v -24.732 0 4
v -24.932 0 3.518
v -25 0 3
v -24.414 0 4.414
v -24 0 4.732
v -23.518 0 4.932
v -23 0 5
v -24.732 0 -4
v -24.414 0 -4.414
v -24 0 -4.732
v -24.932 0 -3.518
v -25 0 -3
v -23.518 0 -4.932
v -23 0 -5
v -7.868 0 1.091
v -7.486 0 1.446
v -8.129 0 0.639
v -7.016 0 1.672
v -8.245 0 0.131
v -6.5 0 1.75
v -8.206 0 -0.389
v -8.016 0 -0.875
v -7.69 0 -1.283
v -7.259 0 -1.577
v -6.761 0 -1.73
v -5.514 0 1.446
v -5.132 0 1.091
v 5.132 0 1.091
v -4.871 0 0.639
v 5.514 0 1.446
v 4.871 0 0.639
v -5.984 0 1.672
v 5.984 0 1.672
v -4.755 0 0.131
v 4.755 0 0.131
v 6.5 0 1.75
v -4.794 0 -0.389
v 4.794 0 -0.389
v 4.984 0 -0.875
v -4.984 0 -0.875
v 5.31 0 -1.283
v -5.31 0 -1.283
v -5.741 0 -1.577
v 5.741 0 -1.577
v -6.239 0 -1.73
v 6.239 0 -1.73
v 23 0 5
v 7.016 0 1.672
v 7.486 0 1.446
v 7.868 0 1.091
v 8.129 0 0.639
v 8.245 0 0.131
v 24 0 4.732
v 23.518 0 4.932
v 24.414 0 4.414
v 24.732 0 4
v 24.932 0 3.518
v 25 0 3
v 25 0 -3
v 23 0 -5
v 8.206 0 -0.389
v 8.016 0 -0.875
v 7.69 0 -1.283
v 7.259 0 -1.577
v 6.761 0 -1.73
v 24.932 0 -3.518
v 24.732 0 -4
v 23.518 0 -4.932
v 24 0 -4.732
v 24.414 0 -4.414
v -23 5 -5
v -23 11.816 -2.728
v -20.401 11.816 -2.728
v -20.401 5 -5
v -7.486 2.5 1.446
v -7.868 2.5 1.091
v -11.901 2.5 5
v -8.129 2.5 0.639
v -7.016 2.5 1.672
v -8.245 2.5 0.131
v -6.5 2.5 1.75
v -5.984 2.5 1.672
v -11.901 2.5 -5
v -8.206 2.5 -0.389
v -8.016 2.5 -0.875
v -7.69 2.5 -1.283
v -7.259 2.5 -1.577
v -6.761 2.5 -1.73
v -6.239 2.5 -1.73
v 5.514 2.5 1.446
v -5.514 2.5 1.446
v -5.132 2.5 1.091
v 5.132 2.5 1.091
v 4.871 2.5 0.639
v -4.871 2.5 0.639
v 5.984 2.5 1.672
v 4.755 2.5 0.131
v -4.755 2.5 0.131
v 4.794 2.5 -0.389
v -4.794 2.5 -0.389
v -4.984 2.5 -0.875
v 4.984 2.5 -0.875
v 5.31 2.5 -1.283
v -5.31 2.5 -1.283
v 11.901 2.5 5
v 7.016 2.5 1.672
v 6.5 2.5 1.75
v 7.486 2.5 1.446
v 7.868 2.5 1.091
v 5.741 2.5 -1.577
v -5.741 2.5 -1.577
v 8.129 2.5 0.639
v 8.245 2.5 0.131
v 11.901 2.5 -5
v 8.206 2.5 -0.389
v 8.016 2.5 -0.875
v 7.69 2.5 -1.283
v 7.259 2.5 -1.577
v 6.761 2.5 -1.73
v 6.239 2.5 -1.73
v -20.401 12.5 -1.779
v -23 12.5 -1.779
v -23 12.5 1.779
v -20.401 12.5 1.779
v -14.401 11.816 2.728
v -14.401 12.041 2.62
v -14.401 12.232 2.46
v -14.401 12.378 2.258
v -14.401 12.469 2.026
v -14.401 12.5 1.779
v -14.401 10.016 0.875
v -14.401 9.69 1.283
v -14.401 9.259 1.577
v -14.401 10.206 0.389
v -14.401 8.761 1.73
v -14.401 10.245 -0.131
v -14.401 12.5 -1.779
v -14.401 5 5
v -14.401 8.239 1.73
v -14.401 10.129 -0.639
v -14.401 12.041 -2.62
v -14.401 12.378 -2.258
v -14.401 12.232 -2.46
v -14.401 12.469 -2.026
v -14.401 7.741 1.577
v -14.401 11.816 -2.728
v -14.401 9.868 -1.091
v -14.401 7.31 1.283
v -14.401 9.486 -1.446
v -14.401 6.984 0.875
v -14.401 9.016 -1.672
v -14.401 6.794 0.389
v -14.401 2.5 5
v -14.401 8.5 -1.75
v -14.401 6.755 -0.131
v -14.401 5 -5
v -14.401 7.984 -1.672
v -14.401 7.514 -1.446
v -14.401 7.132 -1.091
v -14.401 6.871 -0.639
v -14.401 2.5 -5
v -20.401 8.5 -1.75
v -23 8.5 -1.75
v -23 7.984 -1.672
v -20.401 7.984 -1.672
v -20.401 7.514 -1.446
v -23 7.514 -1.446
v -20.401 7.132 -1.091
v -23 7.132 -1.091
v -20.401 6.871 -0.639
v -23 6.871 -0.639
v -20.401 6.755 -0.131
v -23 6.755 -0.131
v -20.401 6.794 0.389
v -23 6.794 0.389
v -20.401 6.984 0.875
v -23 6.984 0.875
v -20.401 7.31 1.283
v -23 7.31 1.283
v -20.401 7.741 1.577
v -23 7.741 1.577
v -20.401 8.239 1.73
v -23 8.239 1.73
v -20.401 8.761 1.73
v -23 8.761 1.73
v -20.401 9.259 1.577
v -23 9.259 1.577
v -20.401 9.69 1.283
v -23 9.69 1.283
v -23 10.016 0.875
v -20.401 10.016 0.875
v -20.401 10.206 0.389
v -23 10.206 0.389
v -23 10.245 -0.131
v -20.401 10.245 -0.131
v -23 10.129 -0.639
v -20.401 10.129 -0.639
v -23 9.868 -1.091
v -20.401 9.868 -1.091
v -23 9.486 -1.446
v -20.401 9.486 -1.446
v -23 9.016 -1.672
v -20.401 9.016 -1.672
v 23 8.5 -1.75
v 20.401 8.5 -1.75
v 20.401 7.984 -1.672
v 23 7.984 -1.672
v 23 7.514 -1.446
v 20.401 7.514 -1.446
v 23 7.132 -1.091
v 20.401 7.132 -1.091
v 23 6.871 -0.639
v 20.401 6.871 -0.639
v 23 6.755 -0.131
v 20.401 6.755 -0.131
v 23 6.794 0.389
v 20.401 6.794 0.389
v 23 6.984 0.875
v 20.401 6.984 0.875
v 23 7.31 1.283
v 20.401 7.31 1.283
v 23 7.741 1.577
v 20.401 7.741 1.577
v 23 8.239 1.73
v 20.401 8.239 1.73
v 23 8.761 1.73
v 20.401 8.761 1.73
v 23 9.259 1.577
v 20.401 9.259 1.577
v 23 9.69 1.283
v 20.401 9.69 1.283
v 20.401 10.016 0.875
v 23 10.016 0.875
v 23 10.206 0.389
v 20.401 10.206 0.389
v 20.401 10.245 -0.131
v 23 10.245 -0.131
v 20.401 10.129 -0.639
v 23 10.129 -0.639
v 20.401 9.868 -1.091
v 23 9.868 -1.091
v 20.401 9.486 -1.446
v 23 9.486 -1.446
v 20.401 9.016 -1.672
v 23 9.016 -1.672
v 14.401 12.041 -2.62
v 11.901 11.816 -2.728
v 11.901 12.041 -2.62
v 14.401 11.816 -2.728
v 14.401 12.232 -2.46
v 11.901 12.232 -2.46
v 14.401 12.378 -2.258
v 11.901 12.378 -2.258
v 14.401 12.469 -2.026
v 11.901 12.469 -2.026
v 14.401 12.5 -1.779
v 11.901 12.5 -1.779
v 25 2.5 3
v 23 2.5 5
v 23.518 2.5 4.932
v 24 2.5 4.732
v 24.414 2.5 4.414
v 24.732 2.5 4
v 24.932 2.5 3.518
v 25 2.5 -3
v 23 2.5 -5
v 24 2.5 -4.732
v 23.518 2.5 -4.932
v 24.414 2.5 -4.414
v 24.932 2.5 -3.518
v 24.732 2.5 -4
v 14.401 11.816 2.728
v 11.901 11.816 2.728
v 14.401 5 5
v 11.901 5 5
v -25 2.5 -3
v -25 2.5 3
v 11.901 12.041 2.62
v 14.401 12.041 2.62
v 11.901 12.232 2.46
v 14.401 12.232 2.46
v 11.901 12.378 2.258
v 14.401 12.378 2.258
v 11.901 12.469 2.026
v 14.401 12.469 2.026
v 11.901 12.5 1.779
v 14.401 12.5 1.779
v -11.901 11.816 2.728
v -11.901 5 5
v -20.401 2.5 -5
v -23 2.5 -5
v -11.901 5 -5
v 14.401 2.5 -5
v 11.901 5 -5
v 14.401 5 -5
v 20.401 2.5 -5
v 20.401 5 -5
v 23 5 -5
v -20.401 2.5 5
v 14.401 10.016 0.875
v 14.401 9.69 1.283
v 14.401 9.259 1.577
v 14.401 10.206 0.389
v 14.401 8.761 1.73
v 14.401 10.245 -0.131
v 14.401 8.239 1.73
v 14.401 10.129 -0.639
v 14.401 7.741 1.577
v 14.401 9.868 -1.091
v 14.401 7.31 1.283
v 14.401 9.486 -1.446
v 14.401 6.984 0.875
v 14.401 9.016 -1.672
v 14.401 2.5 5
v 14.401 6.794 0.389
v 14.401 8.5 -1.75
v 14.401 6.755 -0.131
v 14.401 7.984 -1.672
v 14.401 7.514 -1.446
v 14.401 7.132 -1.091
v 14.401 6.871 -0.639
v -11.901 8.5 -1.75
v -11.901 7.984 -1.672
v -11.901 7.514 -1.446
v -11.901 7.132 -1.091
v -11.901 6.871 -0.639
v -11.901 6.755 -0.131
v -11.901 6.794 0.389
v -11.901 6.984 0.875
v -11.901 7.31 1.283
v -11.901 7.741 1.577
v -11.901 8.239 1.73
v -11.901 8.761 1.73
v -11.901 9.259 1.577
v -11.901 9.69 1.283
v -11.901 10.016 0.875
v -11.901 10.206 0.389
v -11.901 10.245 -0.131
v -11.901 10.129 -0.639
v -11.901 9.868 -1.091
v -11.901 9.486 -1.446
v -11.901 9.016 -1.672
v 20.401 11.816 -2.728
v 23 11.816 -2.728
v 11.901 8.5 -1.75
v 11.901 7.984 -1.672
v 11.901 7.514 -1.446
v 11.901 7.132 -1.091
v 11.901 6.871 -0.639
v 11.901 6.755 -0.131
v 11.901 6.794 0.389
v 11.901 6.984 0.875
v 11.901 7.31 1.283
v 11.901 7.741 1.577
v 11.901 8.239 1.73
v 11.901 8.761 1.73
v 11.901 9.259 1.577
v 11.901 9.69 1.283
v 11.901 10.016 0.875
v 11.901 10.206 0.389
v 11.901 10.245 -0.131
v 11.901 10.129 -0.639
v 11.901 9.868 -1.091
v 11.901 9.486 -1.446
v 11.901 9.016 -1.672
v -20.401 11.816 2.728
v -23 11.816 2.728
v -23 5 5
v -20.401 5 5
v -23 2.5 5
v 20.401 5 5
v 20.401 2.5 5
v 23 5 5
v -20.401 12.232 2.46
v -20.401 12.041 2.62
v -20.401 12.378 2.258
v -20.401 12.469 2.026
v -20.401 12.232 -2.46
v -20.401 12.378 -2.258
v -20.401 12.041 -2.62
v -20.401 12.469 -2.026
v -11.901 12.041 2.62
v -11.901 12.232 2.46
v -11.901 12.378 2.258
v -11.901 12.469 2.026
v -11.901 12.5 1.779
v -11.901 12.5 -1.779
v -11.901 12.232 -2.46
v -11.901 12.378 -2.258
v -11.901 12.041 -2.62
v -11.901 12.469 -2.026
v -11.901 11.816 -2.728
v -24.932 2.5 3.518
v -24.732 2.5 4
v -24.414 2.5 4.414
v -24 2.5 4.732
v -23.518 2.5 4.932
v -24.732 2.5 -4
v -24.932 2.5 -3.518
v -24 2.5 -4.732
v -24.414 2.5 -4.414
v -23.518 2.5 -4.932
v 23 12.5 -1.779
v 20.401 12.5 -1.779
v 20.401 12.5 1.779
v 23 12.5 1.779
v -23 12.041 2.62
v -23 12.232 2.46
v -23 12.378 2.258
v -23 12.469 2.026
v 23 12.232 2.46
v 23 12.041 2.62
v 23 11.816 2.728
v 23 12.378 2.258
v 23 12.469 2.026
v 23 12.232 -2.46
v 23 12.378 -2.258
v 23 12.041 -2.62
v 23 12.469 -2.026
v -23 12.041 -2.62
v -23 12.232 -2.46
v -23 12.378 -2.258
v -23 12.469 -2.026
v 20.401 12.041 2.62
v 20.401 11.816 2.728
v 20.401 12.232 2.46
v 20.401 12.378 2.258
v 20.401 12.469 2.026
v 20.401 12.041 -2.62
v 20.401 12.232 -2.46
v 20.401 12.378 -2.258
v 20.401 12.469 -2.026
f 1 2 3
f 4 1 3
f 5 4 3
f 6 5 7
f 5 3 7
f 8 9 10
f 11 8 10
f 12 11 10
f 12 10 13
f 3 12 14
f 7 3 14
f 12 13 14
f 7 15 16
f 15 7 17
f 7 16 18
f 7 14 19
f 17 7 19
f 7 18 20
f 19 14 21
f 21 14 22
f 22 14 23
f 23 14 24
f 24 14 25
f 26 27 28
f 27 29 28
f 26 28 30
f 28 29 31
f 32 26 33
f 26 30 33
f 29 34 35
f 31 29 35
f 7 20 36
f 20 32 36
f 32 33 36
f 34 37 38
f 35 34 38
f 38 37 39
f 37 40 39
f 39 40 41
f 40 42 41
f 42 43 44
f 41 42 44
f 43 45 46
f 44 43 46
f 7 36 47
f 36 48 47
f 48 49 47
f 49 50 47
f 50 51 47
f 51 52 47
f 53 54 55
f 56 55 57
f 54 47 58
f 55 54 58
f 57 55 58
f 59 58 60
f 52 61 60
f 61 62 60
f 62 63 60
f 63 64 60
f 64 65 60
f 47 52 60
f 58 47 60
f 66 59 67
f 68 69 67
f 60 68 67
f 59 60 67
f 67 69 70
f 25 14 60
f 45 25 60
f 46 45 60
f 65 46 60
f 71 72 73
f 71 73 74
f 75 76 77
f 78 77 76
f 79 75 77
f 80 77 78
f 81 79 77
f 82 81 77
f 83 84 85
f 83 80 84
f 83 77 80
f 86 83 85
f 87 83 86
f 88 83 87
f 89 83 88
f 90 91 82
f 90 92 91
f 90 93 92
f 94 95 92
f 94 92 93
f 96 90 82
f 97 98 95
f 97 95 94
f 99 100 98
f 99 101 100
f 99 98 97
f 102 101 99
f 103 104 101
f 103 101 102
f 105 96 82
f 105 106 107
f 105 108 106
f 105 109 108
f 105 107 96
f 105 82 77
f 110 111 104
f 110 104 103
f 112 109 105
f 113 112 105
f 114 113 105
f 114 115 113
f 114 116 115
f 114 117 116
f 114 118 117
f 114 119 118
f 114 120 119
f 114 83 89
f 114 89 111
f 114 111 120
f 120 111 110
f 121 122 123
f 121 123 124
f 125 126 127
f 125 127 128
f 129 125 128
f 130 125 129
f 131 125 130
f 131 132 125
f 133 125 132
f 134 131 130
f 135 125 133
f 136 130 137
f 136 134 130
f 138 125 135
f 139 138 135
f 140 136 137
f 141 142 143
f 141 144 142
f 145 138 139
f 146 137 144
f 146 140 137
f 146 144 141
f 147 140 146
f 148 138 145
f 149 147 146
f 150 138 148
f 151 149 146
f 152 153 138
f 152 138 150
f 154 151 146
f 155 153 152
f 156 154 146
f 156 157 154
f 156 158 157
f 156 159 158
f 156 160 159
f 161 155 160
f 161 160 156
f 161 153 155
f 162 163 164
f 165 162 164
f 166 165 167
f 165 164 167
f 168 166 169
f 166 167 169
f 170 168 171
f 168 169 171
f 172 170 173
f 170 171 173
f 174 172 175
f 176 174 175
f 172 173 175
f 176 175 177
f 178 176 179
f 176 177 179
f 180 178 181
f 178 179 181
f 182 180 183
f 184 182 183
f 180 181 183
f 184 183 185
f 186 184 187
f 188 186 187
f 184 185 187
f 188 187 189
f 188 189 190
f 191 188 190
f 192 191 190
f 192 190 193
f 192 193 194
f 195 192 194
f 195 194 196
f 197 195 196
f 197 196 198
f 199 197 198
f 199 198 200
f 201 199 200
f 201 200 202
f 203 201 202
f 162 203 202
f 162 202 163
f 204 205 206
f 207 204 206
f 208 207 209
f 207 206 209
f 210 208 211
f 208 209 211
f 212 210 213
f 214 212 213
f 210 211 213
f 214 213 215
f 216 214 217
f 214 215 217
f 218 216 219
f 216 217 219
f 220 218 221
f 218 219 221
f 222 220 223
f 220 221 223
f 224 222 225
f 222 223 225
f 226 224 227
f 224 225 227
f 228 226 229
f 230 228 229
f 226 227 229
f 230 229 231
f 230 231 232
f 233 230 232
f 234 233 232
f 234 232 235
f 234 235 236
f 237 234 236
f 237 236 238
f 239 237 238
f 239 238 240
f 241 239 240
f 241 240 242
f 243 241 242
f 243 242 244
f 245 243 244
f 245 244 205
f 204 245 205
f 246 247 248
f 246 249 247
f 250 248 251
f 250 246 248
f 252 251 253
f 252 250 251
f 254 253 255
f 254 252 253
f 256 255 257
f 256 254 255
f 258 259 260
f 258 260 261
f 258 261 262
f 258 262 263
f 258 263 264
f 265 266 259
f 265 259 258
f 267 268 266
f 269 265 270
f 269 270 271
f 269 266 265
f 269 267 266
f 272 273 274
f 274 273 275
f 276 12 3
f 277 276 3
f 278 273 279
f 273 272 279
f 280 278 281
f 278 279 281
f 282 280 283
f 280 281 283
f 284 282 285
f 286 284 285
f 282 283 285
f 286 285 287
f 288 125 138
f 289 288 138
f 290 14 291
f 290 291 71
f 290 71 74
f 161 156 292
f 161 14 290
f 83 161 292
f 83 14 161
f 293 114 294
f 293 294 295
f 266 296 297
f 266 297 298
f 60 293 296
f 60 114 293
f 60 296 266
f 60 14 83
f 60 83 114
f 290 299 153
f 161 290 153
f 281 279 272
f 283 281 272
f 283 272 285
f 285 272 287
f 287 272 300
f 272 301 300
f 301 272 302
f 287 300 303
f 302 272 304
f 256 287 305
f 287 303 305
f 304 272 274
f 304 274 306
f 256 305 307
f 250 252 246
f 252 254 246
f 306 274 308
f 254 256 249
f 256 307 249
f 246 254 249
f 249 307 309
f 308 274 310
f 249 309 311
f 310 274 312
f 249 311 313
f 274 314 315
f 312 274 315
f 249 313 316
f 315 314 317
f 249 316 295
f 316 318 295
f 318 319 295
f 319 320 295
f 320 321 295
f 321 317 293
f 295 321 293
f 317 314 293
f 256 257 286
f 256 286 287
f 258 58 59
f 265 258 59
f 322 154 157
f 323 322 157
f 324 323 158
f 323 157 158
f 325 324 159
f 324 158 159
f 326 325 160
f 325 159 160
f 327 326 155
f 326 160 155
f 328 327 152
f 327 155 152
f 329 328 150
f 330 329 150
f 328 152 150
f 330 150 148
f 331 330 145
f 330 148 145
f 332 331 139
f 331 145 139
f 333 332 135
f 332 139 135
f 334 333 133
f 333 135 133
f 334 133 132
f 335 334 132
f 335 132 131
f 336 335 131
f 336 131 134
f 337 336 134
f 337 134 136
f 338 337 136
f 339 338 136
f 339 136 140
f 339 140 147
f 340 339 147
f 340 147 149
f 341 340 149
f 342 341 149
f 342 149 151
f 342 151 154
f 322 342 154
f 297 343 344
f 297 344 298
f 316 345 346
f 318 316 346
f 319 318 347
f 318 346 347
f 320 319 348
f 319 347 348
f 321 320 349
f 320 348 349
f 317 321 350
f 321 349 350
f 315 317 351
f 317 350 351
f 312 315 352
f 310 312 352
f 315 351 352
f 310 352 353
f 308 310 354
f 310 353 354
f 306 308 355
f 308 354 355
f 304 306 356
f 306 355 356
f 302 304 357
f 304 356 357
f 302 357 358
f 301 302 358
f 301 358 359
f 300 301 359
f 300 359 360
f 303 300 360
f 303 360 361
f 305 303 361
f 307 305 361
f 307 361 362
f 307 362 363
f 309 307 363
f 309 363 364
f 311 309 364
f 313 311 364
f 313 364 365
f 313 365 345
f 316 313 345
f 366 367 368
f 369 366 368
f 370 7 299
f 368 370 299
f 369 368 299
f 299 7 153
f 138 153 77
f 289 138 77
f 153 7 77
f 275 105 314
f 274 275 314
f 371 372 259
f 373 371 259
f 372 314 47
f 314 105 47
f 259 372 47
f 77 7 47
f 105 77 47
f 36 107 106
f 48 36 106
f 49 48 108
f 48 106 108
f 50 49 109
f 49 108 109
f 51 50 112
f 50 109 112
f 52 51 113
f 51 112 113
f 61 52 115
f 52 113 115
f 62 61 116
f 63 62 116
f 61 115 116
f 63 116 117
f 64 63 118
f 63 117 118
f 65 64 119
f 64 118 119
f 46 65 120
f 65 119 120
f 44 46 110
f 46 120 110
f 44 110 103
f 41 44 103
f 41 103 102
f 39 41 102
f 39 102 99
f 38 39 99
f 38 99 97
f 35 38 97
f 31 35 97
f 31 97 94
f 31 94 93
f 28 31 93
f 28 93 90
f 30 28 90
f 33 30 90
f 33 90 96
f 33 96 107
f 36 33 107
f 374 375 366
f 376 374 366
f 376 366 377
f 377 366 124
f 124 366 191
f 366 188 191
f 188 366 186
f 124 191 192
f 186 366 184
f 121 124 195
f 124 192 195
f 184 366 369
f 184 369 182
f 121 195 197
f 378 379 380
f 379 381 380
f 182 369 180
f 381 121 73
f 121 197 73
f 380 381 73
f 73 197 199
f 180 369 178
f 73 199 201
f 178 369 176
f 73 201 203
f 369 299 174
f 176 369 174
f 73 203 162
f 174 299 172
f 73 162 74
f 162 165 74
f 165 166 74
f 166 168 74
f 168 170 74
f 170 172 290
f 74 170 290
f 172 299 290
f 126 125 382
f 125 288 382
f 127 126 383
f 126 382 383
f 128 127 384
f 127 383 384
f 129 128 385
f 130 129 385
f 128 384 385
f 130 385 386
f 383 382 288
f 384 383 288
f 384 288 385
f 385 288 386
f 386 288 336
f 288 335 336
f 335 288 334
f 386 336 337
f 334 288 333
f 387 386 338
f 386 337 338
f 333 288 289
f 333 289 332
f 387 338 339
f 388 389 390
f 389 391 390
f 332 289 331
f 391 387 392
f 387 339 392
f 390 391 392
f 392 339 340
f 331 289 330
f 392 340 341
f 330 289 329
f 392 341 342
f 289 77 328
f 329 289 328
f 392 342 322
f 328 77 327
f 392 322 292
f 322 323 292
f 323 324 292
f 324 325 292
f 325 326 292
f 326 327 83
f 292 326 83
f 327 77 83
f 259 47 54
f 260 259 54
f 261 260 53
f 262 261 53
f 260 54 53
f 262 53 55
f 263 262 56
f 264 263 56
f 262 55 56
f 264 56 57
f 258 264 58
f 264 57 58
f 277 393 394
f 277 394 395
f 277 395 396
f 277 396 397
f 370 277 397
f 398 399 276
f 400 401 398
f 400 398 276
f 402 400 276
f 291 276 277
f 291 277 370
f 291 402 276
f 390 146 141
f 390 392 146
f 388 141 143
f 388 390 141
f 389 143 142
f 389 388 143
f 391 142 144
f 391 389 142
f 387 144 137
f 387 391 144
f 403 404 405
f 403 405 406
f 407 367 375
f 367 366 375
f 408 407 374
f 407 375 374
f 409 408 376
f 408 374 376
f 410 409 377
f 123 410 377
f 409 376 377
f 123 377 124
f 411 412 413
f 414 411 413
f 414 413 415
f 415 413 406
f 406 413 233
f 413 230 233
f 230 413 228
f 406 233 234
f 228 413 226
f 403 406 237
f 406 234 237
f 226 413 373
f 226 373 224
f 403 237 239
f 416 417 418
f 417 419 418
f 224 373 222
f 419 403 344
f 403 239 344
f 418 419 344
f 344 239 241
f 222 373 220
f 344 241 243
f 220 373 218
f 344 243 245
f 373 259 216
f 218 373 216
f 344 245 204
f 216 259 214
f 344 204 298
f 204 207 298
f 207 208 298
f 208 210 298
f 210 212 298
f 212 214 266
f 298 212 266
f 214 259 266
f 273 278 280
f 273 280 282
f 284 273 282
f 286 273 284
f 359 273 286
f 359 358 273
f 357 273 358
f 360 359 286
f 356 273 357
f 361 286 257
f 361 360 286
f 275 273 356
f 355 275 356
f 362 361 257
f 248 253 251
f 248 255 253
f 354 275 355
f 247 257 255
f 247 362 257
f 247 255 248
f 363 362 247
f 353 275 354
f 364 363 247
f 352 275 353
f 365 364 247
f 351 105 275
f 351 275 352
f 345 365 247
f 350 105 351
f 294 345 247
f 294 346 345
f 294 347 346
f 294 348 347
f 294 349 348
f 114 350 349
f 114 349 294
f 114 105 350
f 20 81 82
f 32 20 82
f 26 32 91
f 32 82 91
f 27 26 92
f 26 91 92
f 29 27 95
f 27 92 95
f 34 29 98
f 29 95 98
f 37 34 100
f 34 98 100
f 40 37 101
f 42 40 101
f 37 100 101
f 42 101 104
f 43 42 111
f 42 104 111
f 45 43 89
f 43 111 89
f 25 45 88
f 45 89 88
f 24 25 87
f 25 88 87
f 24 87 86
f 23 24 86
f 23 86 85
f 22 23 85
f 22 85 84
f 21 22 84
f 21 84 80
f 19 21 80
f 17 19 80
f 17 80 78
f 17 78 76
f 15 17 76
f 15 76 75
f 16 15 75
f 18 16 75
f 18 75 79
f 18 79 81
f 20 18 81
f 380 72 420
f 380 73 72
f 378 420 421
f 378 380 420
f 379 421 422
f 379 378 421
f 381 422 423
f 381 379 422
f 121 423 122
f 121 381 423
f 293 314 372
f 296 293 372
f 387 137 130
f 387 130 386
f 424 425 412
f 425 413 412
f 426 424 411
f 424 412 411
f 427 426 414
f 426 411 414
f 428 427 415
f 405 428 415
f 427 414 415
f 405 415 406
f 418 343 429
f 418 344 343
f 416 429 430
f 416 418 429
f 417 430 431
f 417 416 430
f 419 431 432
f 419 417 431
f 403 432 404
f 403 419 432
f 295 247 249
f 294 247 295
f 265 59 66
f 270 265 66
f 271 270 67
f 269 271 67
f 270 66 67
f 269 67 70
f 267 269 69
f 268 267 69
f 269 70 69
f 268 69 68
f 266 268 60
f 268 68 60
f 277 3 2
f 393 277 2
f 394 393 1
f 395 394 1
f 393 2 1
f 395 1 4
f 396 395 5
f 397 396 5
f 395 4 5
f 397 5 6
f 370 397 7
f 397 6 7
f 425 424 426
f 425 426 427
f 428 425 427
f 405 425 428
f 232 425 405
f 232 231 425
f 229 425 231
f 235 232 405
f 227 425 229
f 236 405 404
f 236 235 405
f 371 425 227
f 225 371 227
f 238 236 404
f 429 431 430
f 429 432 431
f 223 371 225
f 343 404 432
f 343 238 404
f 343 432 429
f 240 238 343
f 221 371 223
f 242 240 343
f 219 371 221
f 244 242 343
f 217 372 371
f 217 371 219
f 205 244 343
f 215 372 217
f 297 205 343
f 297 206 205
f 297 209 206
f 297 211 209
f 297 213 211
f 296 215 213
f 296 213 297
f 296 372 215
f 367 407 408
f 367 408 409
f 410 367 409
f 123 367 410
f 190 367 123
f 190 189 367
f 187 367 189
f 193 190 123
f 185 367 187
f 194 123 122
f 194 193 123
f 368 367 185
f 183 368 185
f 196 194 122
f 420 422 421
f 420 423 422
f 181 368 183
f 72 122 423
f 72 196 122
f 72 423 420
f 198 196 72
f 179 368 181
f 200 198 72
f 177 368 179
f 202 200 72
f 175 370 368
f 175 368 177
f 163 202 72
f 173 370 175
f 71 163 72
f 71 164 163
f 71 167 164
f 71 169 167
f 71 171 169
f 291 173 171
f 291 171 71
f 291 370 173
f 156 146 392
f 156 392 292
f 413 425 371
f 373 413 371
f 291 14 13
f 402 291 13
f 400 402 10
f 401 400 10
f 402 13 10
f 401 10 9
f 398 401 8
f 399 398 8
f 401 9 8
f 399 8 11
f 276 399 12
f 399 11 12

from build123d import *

# Parameters (mm, degrees)
EXTRUDE_1_DEPTH     = 2.5
SKETCH_3_W          = 2.599185832
SKETCH_3_H          = 10
SKETCH_3_W_2        = 2.5
EXTRUDE_2_DEPTH     = 10
CUT_EXTRUDE_1_DEPTH = 59
SKETCH_5_R          = 1.75
CUT_EXTRUDE_2_DEPTH = 59
FILLET_1_R          = 1
SKETCH_6_R          = 1.75
CUT_EXTRUDE_3_DEPTH = 59


with BuildPart() as part:
    # 草图1 → 凸台-拉伸1 (new body)
    with BuildSketch(Plane(origin=(0, 0, 0), x_dir=(1, 0, 0), z_dir=(0, 1, 0))):
        with BuildLine():
            Line((-23, -5), (23, -5))
            ThreePointArc((23, -5), (24.414213562, -4.414213562), (25, -3))
            Line((25, -3), (25, 3))
            ThreePointArc((25, 3), (24.414213562, 4.414213562), (23, 5))
            Line((23, 5), (-23, 5))
            ThreePointArc((-23, 5), (-24.414213562, 4.414213562), (-25, 3))
            Line((-25, 3), (-25, -3))
            ThreePointArc((-25, -3), (-24.414213562, -4.414213562), (-23, -5))
        make_face()
    extrude(amount=EXTRUDE_1_DEPTH)

    # 草图3 → 凸台-拉伸2 (add)
    with BuildSketch(Plane(origin=(0, 2.5, 0), x_dir=(1, 0, 0), z_dir=(0, 1, 0))):
        with Locations((-21.700407084, 0)):
            Rectangle(SKETCH_3_W, SKETCH_3_H)
        with Locations((-13.150814168, 0)):
            Rectangle(SKETCH_3_W_2, SKETCH_3_H)
        with Locations((13.150814168, 0)):
            Rectangle(SKETCH_3_W_2, SKETCH_3_H)
        with Locations((21.700407084, 0)):
            Rectangle(SKETCH_3_W, SKETCH_3_H)
    extrude(amount=EXTRUDE_2_DEPTH)

    # 草图4 → 切除-拉伸1 (cut)
    with BuildSketch(Plane.ZY.offset(23)):
        Polygon((-2.5, 12.5), (-5, 5), (-5, 12.5), align=None)
        Polygon((5, 5), (5, 12.5), (2.5, 12.5), align=None)
    extrude(amount=-CUT_EXTRUDE_1_DEPTH, mode=Mode.SUBTRACT)

    # 草图5 → 切除-拉伸2 (cut)
    with BuildSketch(Plane.ZY.offset(23)):
        with Locations(Location((0, 8.5, 0), (0, 0, 180))):
            Circle(SKETCH_5_R)
    extrude(amount=-CUT_EXTRUDE_2_DEPTH, mode=Mode.SUBTRACT)

    # 圆角1
    fillet_1_edges = [part.edges().sort_by_distance(p)[0] for p in [
        (-13.150814168, 12.5, -2.5),
        (13.150814168, 12.5, -2.5),
        (-21.700407084, 12.5, -2.5),
        (-13.150814168, 12.5, 2.5),
        (13.150814168, 12.5, 2.5),
        (-21.700407084, 12.5, 2.5),
        (21.700407084, 12.5, 2.5),
        (21.700407084, 12.5, -2.5),
    ]]
    fillet(fillet_1_edges, radius=FILLET_1_R)

    # 草图6 → 切除-拉伸3 (cut)
    with BuildSketch(Plane(origin=(0, 2.5, 0), x_dir=(1, 0, 0), z_dir=(0, 1, 0))):
        with Locations(Location((-6.5, 0, 0), (0, 0, 270))):
            Circle(SKETCH_6_R)
        with Locations(Location((6.5, 0, 0), (0, 0, 270))):
            Circle(SKETCH_6_R)
    extrude(amount=-CUT_EXTRUDE_3_DEPTH, mode=Mode.SUBTRACT)


solid = part.part
